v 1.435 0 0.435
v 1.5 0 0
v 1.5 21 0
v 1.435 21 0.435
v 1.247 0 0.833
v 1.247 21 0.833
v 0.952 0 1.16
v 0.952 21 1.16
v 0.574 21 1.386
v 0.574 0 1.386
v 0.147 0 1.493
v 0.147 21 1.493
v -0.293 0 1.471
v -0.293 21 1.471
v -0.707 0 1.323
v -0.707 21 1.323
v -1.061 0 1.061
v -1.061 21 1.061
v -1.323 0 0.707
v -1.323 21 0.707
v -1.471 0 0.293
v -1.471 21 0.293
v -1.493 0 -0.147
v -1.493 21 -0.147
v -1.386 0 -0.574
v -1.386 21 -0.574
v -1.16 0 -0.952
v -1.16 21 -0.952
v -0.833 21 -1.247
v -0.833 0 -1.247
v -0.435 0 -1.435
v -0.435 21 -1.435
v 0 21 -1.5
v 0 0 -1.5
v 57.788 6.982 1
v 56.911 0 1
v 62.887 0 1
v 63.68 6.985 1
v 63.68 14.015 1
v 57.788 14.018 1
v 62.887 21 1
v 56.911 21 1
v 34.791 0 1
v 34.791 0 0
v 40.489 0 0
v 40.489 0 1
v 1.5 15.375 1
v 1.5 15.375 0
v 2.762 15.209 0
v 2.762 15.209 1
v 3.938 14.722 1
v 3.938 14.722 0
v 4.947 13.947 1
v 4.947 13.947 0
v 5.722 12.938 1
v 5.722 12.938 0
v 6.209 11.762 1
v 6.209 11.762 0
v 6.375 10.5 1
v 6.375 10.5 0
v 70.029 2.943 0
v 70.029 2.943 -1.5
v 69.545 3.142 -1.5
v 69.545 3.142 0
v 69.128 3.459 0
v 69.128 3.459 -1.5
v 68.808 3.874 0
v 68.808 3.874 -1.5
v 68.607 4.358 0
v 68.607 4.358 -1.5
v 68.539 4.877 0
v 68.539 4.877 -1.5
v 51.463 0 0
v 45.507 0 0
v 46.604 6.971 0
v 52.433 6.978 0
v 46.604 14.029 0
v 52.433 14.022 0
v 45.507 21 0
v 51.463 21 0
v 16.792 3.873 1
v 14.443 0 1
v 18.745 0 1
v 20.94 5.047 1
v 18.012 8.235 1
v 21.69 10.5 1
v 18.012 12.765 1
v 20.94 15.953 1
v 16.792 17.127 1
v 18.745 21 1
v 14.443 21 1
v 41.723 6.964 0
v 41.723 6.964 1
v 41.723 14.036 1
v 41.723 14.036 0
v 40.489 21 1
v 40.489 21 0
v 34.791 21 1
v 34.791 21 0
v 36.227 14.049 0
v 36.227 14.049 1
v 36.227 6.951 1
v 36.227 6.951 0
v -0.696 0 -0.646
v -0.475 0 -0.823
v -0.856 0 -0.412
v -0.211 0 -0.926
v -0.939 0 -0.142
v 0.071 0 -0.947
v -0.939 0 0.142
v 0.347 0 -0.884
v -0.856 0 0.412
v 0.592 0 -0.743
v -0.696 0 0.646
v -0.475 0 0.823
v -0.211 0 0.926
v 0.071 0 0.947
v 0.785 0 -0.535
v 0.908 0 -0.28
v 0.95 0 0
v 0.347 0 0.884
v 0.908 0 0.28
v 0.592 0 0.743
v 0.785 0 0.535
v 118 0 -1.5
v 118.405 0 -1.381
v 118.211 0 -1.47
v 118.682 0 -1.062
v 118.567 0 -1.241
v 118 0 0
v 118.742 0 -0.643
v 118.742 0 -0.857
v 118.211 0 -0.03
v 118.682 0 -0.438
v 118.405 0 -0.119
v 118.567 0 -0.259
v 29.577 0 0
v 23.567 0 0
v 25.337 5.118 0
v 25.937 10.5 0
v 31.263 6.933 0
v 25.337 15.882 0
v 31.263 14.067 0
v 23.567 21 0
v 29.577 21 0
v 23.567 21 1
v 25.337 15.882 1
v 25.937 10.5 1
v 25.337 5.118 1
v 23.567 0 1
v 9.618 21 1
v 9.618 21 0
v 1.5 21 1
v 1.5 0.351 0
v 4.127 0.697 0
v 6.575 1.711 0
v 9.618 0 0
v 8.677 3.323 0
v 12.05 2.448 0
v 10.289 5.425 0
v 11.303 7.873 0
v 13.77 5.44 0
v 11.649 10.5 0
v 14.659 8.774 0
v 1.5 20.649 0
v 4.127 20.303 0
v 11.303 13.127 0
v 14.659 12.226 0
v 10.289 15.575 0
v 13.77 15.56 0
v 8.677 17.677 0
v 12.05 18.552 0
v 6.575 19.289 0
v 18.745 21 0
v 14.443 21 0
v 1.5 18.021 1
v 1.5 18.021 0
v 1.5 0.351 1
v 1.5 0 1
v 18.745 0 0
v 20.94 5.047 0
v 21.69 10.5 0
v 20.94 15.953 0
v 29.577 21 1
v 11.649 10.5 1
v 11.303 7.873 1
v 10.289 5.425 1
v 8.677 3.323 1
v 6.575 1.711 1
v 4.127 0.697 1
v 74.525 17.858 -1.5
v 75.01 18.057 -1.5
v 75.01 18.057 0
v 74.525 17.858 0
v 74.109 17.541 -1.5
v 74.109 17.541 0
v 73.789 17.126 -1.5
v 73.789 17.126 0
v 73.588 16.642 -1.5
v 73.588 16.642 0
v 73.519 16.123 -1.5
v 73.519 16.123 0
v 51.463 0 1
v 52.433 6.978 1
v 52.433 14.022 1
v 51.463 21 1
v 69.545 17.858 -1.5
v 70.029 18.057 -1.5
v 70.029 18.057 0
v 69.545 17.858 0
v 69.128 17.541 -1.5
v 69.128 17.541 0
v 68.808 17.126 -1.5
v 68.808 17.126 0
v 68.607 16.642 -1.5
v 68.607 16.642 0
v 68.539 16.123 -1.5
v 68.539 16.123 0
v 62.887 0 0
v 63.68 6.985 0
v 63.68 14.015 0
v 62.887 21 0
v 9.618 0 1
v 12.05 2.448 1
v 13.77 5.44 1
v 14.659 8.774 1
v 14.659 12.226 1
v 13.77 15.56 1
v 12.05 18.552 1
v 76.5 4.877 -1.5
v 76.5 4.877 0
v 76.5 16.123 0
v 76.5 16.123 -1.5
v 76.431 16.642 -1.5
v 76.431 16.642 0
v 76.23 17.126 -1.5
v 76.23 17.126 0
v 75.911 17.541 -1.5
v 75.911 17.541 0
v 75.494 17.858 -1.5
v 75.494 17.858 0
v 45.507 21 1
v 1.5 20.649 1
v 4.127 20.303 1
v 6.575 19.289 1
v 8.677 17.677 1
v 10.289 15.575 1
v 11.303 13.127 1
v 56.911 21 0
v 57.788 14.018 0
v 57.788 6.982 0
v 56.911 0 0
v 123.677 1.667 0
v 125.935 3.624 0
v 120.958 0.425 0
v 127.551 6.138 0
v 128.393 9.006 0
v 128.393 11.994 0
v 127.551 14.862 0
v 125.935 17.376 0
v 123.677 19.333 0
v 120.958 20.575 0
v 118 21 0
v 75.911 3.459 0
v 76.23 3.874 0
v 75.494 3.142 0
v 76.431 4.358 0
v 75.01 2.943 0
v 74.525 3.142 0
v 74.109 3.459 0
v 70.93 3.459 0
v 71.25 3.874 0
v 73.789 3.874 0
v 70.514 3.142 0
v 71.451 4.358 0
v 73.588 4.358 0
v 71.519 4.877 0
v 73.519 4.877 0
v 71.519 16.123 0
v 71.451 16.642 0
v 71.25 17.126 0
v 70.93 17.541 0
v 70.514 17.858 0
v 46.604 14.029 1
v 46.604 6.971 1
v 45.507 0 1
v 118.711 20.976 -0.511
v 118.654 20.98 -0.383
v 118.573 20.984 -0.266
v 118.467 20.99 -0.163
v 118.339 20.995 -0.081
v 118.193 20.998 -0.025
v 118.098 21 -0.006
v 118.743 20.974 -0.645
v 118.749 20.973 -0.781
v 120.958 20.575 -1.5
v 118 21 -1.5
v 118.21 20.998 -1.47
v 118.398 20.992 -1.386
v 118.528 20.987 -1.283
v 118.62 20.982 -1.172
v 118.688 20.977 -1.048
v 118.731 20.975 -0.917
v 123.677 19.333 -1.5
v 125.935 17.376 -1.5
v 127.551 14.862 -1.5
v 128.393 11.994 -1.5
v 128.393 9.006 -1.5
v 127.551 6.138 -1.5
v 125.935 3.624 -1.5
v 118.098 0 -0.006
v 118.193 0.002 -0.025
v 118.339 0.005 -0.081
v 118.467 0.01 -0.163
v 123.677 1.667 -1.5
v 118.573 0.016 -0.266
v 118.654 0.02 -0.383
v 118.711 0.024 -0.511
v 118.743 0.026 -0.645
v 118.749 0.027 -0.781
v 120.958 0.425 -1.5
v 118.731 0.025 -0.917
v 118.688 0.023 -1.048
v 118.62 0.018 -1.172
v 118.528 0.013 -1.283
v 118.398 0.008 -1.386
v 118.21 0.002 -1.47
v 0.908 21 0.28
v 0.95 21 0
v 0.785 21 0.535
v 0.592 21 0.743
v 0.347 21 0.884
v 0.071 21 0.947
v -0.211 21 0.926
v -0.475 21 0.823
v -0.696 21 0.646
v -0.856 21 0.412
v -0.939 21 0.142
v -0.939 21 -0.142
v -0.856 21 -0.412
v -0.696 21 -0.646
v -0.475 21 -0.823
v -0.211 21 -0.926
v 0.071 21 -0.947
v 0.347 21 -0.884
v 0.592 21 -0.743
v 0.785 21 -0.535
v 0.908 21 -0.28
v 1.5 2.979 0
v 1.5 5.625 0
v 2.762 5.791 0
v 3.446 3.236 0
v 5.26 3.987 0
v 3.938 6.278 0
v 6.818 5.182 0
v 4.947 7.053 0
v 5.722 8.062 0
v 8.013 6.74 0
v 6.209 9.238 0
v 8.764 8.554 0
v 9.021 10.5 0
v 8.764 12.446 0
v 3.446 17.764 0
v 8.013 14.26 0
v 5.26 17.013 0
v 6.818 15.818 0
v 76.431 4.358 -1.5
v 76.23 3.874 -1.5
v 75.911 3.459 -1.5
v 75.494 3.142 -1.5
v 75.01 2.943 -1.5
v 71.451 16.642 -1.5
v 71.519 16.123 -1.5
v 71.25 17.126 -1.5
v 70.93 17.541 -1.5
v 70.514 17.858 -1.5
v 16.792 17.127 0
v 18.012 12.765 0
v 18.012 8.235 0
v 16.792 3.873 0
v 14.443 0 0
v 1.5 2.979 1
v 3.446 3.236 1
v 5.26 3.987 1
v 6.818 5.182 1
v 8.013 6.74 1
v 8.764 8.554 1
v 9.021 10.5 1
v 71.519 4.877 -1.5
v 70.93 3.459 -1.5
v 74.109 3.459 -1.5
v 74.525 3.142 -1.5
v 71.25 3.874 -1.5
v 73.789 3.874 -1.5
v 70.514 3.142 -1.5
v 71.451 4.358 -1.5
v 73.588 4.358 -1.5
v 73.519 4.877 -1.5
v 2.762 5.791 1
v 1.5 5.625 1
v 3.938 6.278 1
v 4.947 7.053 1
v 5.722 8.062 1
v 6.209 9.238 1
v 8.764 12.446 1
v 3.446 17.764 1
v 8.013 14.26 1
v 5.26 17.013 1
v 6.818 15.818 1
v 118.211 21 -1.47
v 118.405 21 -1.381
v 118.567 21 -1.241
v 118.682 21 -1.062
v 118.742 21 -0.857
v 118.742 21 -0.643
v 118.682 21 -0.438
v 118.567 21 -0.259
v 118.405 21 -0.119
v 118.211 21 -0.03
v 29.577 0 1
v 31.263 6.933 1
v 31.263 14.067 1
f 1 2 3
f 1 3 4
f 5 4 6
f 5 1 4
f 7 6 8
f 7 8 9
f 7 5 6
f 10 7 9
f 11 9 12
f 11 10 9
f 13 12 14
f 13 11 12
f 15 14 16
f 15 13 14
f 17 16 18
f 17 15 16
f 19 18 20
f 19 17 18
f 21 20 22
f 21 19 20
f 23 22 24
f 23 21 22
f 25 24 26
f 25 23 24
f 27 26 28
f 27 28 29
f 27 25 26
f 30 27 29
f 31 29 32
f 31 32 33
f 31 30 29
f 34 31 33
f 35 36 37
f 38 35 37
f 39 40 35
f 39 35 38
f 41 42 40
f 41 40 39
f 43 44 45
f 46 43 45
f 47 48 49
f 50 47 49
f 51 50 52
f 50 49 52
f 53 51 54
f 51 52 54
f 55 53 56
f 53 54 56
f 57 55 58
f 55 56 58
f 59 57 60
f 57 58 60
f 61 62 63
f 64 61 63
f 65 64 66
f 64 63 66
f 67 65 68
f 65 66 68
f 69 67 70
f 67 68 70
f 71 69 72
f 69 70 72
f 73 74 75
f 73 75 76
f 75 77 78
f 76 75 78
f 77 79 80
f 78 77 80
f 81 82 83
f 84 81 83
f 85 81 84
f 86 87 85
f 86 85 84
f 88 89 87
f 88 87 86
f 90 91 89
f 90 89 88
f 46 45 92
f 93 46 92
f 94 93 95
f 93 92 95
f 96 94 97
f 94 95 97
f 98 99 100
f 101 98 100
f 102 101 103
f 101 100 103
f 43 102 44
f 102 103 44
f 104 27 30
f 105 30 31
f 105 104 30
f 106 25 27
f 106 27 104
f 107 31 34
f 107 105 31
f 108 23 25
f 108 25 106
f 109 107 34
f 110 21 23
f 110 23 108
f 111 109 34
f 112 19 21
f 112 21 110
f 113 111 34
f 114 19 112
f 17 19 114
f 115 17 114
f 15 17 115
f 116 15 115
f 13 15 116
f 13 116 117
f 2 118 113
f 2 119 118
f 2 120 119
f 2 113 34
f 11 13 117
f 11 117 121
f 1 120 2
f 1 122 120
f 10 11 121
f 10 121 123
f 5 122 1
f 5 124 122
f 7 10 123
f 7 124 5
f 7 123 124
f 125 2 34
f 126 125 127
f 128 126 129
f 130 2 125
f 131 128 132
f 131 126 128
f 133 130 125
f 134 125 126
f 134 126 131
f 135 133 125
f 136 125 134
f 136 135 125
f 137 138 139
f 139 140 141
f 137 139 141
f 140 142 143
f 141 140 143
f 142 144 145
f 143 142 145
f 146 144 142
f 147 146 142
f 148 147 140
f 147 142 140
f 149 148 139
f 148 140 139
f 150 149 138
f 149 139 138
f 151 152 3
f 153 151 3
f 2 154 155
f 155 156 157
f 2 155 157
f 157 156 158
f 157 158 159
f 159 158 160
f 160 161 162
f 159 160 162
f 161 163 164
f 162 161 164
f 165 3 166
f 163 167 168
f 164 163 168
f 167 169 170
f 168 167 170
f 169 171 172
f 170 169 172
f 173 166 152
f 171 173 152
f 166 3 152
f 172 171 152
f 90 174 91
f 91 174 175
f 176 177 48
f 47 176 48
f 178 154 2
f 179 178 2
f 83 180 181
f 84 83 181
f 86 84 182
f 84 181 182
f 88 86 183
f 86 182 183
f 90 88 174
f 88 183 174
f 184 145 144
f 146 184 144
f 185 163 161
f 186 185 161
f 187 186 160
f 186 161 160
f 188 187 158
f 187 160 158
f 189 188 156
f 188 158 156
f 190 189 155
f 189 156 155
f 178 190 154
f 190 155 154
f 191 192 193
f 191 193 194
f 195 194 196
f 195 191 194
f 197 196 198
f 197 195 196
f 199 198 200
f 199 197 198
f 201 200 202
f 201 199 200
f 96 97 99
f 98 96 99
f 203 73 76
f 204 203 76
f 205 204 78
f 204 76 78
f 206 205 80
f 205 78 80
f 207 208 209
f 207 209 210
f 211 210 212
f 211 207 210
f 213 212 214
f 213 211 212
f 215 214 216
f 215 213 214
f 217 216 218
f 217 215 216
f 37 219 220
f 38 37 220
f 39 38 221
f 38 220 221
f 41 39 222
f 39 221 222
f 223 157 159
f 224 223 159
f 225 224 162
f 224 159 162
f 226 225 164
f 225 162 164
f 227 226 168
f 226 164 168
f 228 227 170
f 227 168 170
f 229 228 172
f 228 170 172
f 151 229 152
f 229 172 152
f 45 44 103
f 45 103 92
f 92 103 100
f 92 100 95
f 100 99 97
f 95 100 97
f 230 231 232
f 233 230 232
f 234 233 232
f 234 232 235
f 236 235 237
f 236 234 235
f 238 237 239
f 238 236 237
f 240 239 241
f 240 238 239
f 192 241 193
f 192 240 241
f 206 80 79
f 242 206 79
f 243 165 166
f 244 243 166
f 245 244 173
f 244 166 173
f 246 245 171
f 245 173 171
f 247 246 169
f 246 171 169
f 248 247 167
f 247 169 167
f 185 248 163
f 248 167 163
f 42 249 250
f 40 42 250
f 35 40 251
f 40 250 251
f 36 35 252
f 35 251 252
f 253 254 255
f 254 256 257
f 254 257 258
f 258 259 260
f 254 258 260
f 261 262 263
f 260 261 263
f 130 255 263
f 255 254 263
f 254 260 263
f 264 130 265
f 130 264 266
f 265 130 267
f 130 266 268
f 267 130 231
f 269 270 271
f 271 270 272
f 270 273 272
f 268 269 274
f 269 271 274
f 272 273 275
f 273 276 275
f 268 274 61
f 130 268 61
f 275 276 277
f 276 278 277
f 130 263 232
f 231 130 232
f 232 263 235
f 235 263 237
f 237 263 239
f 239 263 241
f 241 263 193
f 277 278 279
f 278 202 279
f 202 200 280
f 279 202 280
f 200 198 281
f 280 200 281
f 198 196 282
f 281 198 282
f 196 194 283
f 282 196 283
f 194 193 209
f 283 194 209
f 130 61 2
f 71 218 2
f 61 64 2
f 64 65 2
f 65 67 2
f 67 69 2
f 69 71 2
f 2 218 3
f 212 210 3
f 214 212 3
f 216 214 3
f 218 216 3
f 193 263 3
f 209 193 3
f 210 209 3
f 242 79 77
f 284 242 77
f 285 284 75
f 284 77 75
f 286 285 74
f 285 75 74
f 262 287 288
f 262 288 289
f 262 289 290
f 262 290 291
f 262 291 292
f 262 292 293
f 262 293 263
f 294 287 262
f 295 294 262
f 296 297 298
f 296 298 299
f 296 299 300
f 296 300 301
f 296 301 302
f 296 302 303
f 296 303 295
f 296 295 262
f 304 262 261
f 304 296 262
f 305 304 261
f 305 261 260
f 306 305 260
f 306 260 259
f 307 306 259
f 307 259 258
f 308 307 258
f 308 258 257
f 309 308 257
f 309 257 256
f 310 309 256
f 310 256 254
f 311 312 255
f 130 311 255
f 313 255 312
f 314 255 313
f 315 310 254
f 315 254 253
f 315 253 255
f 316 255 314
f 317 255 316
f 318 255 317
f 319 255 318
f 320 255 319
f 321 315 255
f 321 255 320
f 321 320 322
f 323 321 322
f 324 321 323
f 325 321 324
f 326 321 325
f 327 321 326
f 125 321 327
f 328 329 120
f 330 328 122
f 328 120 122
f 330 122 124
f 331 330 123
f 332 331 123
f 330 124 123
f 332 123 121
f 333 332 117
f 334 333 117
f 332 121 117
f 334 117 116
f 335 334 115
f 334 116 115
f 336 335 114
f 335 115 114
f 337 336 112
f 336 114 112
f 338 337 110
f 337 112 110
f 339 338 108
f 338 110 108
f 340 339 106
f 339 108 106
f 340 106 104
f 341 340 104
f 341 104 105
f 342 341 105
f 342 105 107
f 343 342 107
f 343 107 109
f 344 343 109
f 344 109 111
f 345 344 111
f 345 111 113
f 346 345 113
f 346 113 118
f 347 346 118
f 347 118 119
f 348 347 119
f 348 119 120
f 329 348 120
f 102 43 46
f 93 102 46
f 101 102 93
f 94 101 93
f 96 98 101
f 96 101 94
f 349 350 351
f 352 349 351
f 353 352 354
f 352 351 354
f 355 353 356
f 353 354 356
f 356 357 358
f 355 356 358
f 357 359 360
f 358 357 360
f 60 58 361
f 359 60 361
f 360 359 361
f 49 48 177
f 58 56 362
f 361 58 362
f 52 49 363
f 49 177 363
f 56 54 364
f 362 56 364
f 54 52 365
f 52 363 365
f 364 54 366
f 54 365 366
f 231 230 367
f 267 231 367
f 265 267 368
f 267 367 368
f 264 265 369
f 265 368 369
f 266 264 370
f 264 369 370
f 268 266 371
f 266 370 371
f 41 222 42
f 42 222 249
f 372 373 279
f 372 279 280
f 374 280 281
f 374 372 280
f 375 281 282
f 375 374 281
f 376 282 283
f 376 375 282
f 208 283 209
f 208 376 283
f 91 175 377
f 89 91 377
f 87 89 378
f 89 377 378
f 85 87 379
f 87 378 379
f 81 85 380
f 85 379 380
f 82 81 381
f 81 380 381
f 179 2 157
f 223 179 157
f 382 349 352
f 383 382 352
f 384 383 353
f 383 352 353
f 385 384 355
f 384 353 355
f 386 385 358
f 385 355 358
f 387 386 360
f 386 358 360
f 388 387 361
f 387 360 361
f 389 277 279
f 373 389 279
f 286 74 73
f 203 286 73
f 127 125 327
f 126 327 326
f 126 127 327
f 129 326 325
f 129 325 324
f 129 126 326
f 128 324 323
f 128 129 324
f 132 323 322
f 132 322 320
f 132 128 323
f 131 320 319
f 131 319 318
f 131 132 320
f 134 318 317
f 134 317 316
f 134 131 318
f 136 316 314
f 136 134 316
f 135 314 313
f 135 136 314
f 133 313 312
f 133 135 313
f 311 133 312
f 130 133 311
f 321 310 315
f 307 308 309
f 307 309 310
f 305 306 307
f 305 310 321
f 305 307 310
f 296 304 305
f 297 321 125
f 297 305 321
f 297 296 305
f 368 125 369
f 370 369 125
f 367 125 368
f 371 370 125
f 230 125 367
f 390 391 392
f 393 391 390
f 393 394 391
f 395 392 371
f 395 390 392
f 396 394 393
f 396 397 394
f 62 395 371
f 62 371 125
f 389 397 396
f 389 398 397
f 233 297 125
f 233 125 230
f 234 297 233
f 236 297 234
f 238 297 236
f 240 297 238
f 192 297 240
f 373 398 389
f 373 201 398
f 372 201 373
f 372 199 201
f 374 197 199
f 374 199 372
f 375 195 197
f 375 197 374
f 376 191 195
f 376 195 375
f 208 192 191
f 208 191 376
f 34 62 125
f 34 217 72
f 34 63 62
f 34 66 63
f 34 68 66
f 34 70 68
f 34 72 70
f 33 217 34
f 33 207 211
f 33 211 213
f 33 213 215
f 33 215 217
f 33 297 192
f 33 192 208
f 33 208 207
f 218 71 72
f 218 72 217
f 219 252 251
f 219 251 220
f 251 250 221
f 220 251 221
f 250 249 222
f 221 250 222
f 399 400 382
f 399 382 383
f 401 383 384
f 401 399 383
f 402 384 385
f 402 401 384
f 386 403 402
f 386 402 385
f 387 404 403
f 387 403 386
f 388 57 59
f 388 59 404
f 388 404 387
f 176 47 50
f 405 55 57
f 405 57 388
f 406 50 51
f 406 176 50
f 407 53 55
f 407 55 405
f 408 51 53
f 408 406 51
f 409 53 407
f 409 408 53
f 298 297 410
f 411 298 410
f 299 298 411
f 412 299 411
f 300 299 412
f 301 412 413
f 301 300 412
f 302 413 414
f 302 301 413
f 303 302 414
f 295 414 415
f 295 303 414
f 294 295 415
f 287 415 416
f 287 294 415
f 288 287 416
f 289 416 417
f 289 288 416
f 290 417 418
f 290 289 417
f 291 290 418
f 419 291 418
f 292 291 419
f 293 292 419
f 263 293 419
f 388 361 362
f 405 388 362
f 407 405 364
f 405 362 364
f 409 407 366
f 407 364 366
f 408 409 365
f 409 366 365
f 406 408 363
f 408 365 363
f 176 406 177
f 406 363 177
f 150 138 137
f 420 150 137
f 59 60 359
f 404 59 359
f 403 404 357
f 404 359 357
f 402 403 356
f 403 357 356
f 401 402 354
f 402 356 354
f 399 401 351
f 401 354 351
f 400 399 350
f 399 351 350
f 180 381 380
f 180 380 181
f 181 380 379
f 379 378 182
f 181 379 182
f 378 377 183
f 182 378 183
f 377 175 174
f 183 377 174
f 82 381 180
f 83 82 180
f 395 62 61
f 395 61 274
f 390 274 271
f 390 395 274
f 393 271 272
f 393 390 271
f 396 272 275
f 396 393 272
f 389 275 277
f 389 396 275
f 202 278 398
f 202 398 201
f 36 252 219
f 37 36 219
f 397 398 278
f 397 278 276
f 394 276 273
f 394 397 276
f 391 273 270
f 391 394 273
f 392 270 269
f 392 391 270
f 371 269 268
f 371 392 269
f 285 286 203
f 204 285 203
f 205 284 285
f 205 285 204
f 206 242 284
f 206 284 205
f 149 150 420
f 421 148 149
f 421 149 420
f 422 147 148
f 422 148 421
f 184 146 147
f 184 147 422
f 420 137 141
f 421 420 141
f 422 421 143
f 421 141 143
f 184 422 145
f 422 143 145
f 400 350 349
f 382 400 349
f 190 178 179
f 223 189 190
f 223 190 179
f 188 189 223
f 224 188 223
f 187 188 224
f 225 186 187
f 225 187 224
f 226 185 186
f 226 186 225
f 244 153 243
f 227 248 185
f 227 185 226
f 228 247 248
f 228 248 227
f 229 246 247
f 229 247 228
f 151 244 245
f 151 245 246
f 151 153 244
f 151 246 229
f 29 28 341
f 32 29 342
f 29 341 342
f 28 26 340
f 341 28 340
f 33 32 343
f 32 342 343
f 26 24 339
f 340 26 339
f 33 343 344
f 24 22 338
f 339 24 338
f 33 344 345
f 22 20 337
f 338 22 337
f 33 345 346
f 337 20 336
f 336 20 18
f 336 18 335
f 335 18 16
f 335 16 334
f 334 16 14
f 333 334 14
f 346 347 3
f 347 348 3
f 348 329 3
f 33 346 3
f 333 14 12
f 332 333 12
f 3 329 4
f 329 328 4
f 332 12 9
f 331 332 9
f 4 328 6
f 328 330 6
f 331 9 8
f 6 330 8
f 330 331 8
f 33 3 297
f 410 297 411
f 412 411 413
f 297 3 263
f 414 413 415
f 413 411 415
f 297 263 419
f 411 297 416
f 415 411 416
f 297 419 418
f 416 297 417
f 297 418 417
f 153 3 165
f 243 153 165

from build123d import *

# Parameters (mm, degrees)
F1_DEPTH    = 21
F3_DEPTH    = 1.5
F4_R        = 0.95
F5_DEPTH    = 25.4
F6_W        = 2.9805600643
F6_H        = 15.2461954355
F7_DEPTH    = 25.4
F8_T1_DEPTH = 1.5
F9_T1_DEPTH = 1.5
F11_DEPTH   = 1


# Not quite as in the source:
# - a fillet or chamfer that OpenCascade refuses, or shapes differently, is made with other operations: its cross-section is extruded or revolved along the edge and cut away or added


with BuildPart() as f1:
    # F0 (on Front) → F1 (new body)
    with BuildSketch(Plane.XZ):
        with BuildLine():
            ThreePointArc((0, -1.5), (1.0606601718, -1.0606601718), (1.5, 0))
            ThreePointArc((1.5, 0), (-1.0606601718, 1.0606601718), (0, -1.5))
        make_face()
        with BuildLine():
            Line((118, 0), (1.5, 0))
            ThreePointArc((1.5, 0), (1.0606601718, -1.0606601718), (0, -1.5))
            Line((0, -1.5), (118, -1.5))
            ThreePointArc((118, -1.5), (118.75, -0.75), (118, 0))
        make_face()
    extrude(amount=-F1_DEPTH)

    # F2 (on face) → F3 (join)
    with BuildSketch(Plane(origin=(0, 0, -1.5), x_dir=(1, 0, 0), z_dir=(0, 0, -1))):
        with BuildLine():
            Line((118, 0), (118, -21))
            ThreePointArc((118, -21), (128.5, -10.5), (118, 0))
        make_face()
    extrude(amount=-F3_DEPTH)

    # F4 (on face) → F5 (cut)
    with BuildSketch(Plane.XZ):
        Circle(F4_R)
    extrude(amount=-F5_DEPTH, mode=Mode.SUBTRACT)

    # F6 (on face) → F7 (cut)
    with BuildSketch(Plane.XY):
        with Locations((70.0291599035, 10.4999999497)):
            Rectangle(F6_W, F6_H)
        with Locations((75.0097199678, 10.5)):
            Rectangle(F6_W, F6_H)
    extrude(amount=-F7_DEPTH, mode=Mode.SUBTRACT)

    # F8: fillet of radius 2 on 4 edges, made by hand

    # F8_s2 → F8_t1 (join)
    with BuildSketch(Plane.XY.offset(-1.5)):
        with BuildLine():
            ThreePointArc((70.5388798714, 2.8769022319), (69.124666309, 3.4626886696), (68.5388798714, 4.8769022319))
            Line((68.5388798714, 4.8769022319), (68.5388798714, 2.8769022319))
            Line((68.5388798714, 2.8769022319), (70.5388798714, 2.8769022319))
        make_face()
        with BuildLine():
            ThreePointArc((70.5388798714, 18.1230976675), (69.124666309, 17.5373112298), (68.5388798714, 16.1230976675))
            Line((68.5388798714, 16.1230976675), (68.5388798714, 18.1230976675))
            Line((68.5388798714, 18.1230976675), (70.5388798714, 18.1230976675))
        make_face()
        with BuildLine():
            ThreePointArc((71.5194399357, 16.1230976675), (70.9336534981, 17.5373112298), (69.5194399357, 18.1230976675))
            Line((69.5194399357, 18.1230976675), (71.5194399357, 18.1230976675))
            Line((71.5194399357, 18.1230976675), (71.5194399357, 16.1230976675))
        make_face()
        with BuildLine():
            ThreePointArc((69.5194399357, 2.8769022319), (70.9336534981, 3.4626886696), (71.5194399357, 4.8769022319))
            Line((71.5194399357, 4.8769022319), (71.5194399357, 2.8769022319))
            Line((71.5194399357, 2.8769022319), (69.5194399357, 2.8769022319))
        make_face()
    extrude(amount=F8_T1_DEPTH)

    # F9: fillet of radius 2 on 4 edges, made by hand

    # F9_s2 → F9_t1 (join)
    with BuildSketch(Plane.XY.offset(-1.5)):
        with BuildLine():
            ThreePointArc((75.5194399357, 18.1230977178), (74.1052263733, 17.5373112801), (73.5194399357, 16.1230977178))
            Line((73.5194399357, 16.1230977178), (73.5194399357, 18.1230977178))
            Line((73.5194399357, 18.1230977178), (75.5194399357, 18.1230977178))
        make_face()
        with BuildLine():
            ThreePointArc((73.5194399357, 4.8769022822), (74.1052263733, 3.4626887199), (75.5194399357, 2.8769022822))
            Line((75.5194399357, 2.8769022822), (73.5194399357, 2.8769022822))
            Line((73.5194399357, 2.8769022822), (73.5194399357, 4.8769022822))
        make_face()
        with BuildLine():
            ThreePointArc((76.5, 4.8769022822), (75.9142135624, 3.4626887199), (74.5, 2.8769022822))
            Line((74.5, 2.8769022822), (76.5, 2.8769022822))
            Line((76.5, 2.8769022822), (76.5, 4.8769022822))
        make_face()
        with BuildLine():
            ThreePointArc((76.5, 16.1230977178), (75.9142135624, 17.5373112801), (74.5, 18.1230977178))
            Line((74.5, 18.1230977178), (76.5, 18.1230977178))
            Line((76.5, 18.1230977178), (76.5, 16.1230977178))
        make_face()
    extrude(amount=F9_T1_DEPTH)


with BuildPart() as f11:
    # F10 (on face) → F11 (new body)
    with BuildSketch(Plane.XY):
        with BuildLine():
            Line((1.5, 18.0205481217), (1.5, 15.3751391684))
            ThreePointArc((1.5, 15.3751391684), (4.9472439652, 13.9472439652), (6.3751391684, 10.5))
            ThreePointArc((6.3751391684, 10.5), (4.9472439652, 7.0527560348), (1.5, 5.6248608316))
            Line((1.5, 5.6248608316), (1.5, 2.9794518783))
            ThreePointArc((1.5, 2.9794518783), (6.8178305751, 5.1821694249), (9.0205481217, 10.5))
            ThreePointArc((9.0205481217, 10.5), (6.8178305751, 15.8178305751), (1.5, 18.0205481217))
        make_face()
    extrude(amount=F11_DEPTH)


with BuildPart() as f11b:
    # F10 (on face) → F11, piece 2 (new body)
    with BuildSketch(Plane.XY):
        with BuildLine():
            Line((1.5, 21), (1.5, 20.6492265591))
            ThreePointArc((1.5, 20.6492265591), (8.6765869237, 17.6765869237), (11.6492265591, 10.5))
            ThreePointArc((11.6492265591, 10.5), (8.6765869237, 3.3234130763), (1.5, 0.3507734409))
            Line((1.5, 0.3507734409), (1.5, 0))
            Line((1.5, 0), (9.6176613001, 0))
            ThreePointArc((9.6176613001, 0), (14.7720166133, 10.5), (9.6176613001, 21))
            Line((9.6176613001, 21), (1.5, 21))
        make_face()
    extrude(amount=F11_DEPTH)


with BuildPart() as f11c:
    # F10 (on face) → F11, piece 3 (new body)
    with BuildSketch(Plane.XY):
        with BuildLine():
            Line((18.7453661335, 21), (14.4430249836, 21))
            ThreePointArc((14.4430249836, 21), (18.1664902042, 10.5), (14.4430249836, 0))
            Line((14.4430249836, 0), (18.7453661335, 0))
            ThreePointArc((18.7453661335, 0), (21.6904099284, 10.5), (18.7453661335, 21))
        make_face()
    extrude(amount=F11_DEPTH)


with BuildPart() as f11d:
    # F10 (on face) → F11, piece 4 (new body)
    with BuildSketch(Plane.XY):
        with BuildLine():
            Line((29.5774242132, 21), (23.5667478281, 21))
            ThreePointArc((23.5667478281, 21), (25.9374990477, 10.5), (23.5667478281, 0))
            Line((23.5667478281, 0), (29.5774242132, 0))
            ThreePointArc((29.5774242132, 0), (31.4765199856, 10.5), (29.5774242132, 21))
        make_face()
    extrude(amount=F11_DEPTH)


with BuildPart() as f11e:
    # F10 (on face) → F11, piece 5 (new body)
    with BuildSketch(Plane.XY):
        with BuildLine():
            Line((40.4886008324, 21), (34.7911855171, 21))
            ThreePointArc((34.7911855171, 21), (36.4077789774, 10.5), (34.7911855171, 0))
            Line((34.7911855171, 0), (40.4886008324, 0))
            ThreePointArc((40.4886008324, 0), (41.8777289464, 10.5), (40.4886008324, 21))
        make_face()
    extrude(amount=F11_DEPTH)


with BuildPart() as f11f:
    # F10 (on face) → F11, piece 6 (new body)
    with BuildSketch(Plane.XY):
        with BuildLine():
            Line((51.4633184784, 21), (45.5065769526, 21))
            ThreePointArc((45.5065769526, 21), (46.741892258, 10.5), (45.5065769526, 0))
            Line((45.5065769526, 0), (51.4633184784, 0))
            ThreePointArc((51.4633184784, 0), (52.5547078473, 10.5), (51.4633184784, 21))
        make_face()
    extrude(amount=F11_DEPTH)


with BuildPart() as f11g:
    # F10 (on face) → F11, piece 7 (new body)
    with BuildSketch(Plane.XY):
        with BuildLine():
            Line((62.8874615739, 21), (56.9114878139, 21))
            ThreePointArc((56.9114878139, 21), (57.897544111, 10.5), (56.9114878139, 0))
            Line((56.9114878139, 0), (62.8874615739, 0))
            ThreePointArc((62.8874615739, 0), (63.7789726833, 10.5), (62.8874615739, 21))
        make_face()
    extrude(amount=F11_DEPTH)


solid = Compound([f1.part, f11.part, f11b.part, f11c.part, f11d.part, f11e.part, f11f.part, f11g.part])
